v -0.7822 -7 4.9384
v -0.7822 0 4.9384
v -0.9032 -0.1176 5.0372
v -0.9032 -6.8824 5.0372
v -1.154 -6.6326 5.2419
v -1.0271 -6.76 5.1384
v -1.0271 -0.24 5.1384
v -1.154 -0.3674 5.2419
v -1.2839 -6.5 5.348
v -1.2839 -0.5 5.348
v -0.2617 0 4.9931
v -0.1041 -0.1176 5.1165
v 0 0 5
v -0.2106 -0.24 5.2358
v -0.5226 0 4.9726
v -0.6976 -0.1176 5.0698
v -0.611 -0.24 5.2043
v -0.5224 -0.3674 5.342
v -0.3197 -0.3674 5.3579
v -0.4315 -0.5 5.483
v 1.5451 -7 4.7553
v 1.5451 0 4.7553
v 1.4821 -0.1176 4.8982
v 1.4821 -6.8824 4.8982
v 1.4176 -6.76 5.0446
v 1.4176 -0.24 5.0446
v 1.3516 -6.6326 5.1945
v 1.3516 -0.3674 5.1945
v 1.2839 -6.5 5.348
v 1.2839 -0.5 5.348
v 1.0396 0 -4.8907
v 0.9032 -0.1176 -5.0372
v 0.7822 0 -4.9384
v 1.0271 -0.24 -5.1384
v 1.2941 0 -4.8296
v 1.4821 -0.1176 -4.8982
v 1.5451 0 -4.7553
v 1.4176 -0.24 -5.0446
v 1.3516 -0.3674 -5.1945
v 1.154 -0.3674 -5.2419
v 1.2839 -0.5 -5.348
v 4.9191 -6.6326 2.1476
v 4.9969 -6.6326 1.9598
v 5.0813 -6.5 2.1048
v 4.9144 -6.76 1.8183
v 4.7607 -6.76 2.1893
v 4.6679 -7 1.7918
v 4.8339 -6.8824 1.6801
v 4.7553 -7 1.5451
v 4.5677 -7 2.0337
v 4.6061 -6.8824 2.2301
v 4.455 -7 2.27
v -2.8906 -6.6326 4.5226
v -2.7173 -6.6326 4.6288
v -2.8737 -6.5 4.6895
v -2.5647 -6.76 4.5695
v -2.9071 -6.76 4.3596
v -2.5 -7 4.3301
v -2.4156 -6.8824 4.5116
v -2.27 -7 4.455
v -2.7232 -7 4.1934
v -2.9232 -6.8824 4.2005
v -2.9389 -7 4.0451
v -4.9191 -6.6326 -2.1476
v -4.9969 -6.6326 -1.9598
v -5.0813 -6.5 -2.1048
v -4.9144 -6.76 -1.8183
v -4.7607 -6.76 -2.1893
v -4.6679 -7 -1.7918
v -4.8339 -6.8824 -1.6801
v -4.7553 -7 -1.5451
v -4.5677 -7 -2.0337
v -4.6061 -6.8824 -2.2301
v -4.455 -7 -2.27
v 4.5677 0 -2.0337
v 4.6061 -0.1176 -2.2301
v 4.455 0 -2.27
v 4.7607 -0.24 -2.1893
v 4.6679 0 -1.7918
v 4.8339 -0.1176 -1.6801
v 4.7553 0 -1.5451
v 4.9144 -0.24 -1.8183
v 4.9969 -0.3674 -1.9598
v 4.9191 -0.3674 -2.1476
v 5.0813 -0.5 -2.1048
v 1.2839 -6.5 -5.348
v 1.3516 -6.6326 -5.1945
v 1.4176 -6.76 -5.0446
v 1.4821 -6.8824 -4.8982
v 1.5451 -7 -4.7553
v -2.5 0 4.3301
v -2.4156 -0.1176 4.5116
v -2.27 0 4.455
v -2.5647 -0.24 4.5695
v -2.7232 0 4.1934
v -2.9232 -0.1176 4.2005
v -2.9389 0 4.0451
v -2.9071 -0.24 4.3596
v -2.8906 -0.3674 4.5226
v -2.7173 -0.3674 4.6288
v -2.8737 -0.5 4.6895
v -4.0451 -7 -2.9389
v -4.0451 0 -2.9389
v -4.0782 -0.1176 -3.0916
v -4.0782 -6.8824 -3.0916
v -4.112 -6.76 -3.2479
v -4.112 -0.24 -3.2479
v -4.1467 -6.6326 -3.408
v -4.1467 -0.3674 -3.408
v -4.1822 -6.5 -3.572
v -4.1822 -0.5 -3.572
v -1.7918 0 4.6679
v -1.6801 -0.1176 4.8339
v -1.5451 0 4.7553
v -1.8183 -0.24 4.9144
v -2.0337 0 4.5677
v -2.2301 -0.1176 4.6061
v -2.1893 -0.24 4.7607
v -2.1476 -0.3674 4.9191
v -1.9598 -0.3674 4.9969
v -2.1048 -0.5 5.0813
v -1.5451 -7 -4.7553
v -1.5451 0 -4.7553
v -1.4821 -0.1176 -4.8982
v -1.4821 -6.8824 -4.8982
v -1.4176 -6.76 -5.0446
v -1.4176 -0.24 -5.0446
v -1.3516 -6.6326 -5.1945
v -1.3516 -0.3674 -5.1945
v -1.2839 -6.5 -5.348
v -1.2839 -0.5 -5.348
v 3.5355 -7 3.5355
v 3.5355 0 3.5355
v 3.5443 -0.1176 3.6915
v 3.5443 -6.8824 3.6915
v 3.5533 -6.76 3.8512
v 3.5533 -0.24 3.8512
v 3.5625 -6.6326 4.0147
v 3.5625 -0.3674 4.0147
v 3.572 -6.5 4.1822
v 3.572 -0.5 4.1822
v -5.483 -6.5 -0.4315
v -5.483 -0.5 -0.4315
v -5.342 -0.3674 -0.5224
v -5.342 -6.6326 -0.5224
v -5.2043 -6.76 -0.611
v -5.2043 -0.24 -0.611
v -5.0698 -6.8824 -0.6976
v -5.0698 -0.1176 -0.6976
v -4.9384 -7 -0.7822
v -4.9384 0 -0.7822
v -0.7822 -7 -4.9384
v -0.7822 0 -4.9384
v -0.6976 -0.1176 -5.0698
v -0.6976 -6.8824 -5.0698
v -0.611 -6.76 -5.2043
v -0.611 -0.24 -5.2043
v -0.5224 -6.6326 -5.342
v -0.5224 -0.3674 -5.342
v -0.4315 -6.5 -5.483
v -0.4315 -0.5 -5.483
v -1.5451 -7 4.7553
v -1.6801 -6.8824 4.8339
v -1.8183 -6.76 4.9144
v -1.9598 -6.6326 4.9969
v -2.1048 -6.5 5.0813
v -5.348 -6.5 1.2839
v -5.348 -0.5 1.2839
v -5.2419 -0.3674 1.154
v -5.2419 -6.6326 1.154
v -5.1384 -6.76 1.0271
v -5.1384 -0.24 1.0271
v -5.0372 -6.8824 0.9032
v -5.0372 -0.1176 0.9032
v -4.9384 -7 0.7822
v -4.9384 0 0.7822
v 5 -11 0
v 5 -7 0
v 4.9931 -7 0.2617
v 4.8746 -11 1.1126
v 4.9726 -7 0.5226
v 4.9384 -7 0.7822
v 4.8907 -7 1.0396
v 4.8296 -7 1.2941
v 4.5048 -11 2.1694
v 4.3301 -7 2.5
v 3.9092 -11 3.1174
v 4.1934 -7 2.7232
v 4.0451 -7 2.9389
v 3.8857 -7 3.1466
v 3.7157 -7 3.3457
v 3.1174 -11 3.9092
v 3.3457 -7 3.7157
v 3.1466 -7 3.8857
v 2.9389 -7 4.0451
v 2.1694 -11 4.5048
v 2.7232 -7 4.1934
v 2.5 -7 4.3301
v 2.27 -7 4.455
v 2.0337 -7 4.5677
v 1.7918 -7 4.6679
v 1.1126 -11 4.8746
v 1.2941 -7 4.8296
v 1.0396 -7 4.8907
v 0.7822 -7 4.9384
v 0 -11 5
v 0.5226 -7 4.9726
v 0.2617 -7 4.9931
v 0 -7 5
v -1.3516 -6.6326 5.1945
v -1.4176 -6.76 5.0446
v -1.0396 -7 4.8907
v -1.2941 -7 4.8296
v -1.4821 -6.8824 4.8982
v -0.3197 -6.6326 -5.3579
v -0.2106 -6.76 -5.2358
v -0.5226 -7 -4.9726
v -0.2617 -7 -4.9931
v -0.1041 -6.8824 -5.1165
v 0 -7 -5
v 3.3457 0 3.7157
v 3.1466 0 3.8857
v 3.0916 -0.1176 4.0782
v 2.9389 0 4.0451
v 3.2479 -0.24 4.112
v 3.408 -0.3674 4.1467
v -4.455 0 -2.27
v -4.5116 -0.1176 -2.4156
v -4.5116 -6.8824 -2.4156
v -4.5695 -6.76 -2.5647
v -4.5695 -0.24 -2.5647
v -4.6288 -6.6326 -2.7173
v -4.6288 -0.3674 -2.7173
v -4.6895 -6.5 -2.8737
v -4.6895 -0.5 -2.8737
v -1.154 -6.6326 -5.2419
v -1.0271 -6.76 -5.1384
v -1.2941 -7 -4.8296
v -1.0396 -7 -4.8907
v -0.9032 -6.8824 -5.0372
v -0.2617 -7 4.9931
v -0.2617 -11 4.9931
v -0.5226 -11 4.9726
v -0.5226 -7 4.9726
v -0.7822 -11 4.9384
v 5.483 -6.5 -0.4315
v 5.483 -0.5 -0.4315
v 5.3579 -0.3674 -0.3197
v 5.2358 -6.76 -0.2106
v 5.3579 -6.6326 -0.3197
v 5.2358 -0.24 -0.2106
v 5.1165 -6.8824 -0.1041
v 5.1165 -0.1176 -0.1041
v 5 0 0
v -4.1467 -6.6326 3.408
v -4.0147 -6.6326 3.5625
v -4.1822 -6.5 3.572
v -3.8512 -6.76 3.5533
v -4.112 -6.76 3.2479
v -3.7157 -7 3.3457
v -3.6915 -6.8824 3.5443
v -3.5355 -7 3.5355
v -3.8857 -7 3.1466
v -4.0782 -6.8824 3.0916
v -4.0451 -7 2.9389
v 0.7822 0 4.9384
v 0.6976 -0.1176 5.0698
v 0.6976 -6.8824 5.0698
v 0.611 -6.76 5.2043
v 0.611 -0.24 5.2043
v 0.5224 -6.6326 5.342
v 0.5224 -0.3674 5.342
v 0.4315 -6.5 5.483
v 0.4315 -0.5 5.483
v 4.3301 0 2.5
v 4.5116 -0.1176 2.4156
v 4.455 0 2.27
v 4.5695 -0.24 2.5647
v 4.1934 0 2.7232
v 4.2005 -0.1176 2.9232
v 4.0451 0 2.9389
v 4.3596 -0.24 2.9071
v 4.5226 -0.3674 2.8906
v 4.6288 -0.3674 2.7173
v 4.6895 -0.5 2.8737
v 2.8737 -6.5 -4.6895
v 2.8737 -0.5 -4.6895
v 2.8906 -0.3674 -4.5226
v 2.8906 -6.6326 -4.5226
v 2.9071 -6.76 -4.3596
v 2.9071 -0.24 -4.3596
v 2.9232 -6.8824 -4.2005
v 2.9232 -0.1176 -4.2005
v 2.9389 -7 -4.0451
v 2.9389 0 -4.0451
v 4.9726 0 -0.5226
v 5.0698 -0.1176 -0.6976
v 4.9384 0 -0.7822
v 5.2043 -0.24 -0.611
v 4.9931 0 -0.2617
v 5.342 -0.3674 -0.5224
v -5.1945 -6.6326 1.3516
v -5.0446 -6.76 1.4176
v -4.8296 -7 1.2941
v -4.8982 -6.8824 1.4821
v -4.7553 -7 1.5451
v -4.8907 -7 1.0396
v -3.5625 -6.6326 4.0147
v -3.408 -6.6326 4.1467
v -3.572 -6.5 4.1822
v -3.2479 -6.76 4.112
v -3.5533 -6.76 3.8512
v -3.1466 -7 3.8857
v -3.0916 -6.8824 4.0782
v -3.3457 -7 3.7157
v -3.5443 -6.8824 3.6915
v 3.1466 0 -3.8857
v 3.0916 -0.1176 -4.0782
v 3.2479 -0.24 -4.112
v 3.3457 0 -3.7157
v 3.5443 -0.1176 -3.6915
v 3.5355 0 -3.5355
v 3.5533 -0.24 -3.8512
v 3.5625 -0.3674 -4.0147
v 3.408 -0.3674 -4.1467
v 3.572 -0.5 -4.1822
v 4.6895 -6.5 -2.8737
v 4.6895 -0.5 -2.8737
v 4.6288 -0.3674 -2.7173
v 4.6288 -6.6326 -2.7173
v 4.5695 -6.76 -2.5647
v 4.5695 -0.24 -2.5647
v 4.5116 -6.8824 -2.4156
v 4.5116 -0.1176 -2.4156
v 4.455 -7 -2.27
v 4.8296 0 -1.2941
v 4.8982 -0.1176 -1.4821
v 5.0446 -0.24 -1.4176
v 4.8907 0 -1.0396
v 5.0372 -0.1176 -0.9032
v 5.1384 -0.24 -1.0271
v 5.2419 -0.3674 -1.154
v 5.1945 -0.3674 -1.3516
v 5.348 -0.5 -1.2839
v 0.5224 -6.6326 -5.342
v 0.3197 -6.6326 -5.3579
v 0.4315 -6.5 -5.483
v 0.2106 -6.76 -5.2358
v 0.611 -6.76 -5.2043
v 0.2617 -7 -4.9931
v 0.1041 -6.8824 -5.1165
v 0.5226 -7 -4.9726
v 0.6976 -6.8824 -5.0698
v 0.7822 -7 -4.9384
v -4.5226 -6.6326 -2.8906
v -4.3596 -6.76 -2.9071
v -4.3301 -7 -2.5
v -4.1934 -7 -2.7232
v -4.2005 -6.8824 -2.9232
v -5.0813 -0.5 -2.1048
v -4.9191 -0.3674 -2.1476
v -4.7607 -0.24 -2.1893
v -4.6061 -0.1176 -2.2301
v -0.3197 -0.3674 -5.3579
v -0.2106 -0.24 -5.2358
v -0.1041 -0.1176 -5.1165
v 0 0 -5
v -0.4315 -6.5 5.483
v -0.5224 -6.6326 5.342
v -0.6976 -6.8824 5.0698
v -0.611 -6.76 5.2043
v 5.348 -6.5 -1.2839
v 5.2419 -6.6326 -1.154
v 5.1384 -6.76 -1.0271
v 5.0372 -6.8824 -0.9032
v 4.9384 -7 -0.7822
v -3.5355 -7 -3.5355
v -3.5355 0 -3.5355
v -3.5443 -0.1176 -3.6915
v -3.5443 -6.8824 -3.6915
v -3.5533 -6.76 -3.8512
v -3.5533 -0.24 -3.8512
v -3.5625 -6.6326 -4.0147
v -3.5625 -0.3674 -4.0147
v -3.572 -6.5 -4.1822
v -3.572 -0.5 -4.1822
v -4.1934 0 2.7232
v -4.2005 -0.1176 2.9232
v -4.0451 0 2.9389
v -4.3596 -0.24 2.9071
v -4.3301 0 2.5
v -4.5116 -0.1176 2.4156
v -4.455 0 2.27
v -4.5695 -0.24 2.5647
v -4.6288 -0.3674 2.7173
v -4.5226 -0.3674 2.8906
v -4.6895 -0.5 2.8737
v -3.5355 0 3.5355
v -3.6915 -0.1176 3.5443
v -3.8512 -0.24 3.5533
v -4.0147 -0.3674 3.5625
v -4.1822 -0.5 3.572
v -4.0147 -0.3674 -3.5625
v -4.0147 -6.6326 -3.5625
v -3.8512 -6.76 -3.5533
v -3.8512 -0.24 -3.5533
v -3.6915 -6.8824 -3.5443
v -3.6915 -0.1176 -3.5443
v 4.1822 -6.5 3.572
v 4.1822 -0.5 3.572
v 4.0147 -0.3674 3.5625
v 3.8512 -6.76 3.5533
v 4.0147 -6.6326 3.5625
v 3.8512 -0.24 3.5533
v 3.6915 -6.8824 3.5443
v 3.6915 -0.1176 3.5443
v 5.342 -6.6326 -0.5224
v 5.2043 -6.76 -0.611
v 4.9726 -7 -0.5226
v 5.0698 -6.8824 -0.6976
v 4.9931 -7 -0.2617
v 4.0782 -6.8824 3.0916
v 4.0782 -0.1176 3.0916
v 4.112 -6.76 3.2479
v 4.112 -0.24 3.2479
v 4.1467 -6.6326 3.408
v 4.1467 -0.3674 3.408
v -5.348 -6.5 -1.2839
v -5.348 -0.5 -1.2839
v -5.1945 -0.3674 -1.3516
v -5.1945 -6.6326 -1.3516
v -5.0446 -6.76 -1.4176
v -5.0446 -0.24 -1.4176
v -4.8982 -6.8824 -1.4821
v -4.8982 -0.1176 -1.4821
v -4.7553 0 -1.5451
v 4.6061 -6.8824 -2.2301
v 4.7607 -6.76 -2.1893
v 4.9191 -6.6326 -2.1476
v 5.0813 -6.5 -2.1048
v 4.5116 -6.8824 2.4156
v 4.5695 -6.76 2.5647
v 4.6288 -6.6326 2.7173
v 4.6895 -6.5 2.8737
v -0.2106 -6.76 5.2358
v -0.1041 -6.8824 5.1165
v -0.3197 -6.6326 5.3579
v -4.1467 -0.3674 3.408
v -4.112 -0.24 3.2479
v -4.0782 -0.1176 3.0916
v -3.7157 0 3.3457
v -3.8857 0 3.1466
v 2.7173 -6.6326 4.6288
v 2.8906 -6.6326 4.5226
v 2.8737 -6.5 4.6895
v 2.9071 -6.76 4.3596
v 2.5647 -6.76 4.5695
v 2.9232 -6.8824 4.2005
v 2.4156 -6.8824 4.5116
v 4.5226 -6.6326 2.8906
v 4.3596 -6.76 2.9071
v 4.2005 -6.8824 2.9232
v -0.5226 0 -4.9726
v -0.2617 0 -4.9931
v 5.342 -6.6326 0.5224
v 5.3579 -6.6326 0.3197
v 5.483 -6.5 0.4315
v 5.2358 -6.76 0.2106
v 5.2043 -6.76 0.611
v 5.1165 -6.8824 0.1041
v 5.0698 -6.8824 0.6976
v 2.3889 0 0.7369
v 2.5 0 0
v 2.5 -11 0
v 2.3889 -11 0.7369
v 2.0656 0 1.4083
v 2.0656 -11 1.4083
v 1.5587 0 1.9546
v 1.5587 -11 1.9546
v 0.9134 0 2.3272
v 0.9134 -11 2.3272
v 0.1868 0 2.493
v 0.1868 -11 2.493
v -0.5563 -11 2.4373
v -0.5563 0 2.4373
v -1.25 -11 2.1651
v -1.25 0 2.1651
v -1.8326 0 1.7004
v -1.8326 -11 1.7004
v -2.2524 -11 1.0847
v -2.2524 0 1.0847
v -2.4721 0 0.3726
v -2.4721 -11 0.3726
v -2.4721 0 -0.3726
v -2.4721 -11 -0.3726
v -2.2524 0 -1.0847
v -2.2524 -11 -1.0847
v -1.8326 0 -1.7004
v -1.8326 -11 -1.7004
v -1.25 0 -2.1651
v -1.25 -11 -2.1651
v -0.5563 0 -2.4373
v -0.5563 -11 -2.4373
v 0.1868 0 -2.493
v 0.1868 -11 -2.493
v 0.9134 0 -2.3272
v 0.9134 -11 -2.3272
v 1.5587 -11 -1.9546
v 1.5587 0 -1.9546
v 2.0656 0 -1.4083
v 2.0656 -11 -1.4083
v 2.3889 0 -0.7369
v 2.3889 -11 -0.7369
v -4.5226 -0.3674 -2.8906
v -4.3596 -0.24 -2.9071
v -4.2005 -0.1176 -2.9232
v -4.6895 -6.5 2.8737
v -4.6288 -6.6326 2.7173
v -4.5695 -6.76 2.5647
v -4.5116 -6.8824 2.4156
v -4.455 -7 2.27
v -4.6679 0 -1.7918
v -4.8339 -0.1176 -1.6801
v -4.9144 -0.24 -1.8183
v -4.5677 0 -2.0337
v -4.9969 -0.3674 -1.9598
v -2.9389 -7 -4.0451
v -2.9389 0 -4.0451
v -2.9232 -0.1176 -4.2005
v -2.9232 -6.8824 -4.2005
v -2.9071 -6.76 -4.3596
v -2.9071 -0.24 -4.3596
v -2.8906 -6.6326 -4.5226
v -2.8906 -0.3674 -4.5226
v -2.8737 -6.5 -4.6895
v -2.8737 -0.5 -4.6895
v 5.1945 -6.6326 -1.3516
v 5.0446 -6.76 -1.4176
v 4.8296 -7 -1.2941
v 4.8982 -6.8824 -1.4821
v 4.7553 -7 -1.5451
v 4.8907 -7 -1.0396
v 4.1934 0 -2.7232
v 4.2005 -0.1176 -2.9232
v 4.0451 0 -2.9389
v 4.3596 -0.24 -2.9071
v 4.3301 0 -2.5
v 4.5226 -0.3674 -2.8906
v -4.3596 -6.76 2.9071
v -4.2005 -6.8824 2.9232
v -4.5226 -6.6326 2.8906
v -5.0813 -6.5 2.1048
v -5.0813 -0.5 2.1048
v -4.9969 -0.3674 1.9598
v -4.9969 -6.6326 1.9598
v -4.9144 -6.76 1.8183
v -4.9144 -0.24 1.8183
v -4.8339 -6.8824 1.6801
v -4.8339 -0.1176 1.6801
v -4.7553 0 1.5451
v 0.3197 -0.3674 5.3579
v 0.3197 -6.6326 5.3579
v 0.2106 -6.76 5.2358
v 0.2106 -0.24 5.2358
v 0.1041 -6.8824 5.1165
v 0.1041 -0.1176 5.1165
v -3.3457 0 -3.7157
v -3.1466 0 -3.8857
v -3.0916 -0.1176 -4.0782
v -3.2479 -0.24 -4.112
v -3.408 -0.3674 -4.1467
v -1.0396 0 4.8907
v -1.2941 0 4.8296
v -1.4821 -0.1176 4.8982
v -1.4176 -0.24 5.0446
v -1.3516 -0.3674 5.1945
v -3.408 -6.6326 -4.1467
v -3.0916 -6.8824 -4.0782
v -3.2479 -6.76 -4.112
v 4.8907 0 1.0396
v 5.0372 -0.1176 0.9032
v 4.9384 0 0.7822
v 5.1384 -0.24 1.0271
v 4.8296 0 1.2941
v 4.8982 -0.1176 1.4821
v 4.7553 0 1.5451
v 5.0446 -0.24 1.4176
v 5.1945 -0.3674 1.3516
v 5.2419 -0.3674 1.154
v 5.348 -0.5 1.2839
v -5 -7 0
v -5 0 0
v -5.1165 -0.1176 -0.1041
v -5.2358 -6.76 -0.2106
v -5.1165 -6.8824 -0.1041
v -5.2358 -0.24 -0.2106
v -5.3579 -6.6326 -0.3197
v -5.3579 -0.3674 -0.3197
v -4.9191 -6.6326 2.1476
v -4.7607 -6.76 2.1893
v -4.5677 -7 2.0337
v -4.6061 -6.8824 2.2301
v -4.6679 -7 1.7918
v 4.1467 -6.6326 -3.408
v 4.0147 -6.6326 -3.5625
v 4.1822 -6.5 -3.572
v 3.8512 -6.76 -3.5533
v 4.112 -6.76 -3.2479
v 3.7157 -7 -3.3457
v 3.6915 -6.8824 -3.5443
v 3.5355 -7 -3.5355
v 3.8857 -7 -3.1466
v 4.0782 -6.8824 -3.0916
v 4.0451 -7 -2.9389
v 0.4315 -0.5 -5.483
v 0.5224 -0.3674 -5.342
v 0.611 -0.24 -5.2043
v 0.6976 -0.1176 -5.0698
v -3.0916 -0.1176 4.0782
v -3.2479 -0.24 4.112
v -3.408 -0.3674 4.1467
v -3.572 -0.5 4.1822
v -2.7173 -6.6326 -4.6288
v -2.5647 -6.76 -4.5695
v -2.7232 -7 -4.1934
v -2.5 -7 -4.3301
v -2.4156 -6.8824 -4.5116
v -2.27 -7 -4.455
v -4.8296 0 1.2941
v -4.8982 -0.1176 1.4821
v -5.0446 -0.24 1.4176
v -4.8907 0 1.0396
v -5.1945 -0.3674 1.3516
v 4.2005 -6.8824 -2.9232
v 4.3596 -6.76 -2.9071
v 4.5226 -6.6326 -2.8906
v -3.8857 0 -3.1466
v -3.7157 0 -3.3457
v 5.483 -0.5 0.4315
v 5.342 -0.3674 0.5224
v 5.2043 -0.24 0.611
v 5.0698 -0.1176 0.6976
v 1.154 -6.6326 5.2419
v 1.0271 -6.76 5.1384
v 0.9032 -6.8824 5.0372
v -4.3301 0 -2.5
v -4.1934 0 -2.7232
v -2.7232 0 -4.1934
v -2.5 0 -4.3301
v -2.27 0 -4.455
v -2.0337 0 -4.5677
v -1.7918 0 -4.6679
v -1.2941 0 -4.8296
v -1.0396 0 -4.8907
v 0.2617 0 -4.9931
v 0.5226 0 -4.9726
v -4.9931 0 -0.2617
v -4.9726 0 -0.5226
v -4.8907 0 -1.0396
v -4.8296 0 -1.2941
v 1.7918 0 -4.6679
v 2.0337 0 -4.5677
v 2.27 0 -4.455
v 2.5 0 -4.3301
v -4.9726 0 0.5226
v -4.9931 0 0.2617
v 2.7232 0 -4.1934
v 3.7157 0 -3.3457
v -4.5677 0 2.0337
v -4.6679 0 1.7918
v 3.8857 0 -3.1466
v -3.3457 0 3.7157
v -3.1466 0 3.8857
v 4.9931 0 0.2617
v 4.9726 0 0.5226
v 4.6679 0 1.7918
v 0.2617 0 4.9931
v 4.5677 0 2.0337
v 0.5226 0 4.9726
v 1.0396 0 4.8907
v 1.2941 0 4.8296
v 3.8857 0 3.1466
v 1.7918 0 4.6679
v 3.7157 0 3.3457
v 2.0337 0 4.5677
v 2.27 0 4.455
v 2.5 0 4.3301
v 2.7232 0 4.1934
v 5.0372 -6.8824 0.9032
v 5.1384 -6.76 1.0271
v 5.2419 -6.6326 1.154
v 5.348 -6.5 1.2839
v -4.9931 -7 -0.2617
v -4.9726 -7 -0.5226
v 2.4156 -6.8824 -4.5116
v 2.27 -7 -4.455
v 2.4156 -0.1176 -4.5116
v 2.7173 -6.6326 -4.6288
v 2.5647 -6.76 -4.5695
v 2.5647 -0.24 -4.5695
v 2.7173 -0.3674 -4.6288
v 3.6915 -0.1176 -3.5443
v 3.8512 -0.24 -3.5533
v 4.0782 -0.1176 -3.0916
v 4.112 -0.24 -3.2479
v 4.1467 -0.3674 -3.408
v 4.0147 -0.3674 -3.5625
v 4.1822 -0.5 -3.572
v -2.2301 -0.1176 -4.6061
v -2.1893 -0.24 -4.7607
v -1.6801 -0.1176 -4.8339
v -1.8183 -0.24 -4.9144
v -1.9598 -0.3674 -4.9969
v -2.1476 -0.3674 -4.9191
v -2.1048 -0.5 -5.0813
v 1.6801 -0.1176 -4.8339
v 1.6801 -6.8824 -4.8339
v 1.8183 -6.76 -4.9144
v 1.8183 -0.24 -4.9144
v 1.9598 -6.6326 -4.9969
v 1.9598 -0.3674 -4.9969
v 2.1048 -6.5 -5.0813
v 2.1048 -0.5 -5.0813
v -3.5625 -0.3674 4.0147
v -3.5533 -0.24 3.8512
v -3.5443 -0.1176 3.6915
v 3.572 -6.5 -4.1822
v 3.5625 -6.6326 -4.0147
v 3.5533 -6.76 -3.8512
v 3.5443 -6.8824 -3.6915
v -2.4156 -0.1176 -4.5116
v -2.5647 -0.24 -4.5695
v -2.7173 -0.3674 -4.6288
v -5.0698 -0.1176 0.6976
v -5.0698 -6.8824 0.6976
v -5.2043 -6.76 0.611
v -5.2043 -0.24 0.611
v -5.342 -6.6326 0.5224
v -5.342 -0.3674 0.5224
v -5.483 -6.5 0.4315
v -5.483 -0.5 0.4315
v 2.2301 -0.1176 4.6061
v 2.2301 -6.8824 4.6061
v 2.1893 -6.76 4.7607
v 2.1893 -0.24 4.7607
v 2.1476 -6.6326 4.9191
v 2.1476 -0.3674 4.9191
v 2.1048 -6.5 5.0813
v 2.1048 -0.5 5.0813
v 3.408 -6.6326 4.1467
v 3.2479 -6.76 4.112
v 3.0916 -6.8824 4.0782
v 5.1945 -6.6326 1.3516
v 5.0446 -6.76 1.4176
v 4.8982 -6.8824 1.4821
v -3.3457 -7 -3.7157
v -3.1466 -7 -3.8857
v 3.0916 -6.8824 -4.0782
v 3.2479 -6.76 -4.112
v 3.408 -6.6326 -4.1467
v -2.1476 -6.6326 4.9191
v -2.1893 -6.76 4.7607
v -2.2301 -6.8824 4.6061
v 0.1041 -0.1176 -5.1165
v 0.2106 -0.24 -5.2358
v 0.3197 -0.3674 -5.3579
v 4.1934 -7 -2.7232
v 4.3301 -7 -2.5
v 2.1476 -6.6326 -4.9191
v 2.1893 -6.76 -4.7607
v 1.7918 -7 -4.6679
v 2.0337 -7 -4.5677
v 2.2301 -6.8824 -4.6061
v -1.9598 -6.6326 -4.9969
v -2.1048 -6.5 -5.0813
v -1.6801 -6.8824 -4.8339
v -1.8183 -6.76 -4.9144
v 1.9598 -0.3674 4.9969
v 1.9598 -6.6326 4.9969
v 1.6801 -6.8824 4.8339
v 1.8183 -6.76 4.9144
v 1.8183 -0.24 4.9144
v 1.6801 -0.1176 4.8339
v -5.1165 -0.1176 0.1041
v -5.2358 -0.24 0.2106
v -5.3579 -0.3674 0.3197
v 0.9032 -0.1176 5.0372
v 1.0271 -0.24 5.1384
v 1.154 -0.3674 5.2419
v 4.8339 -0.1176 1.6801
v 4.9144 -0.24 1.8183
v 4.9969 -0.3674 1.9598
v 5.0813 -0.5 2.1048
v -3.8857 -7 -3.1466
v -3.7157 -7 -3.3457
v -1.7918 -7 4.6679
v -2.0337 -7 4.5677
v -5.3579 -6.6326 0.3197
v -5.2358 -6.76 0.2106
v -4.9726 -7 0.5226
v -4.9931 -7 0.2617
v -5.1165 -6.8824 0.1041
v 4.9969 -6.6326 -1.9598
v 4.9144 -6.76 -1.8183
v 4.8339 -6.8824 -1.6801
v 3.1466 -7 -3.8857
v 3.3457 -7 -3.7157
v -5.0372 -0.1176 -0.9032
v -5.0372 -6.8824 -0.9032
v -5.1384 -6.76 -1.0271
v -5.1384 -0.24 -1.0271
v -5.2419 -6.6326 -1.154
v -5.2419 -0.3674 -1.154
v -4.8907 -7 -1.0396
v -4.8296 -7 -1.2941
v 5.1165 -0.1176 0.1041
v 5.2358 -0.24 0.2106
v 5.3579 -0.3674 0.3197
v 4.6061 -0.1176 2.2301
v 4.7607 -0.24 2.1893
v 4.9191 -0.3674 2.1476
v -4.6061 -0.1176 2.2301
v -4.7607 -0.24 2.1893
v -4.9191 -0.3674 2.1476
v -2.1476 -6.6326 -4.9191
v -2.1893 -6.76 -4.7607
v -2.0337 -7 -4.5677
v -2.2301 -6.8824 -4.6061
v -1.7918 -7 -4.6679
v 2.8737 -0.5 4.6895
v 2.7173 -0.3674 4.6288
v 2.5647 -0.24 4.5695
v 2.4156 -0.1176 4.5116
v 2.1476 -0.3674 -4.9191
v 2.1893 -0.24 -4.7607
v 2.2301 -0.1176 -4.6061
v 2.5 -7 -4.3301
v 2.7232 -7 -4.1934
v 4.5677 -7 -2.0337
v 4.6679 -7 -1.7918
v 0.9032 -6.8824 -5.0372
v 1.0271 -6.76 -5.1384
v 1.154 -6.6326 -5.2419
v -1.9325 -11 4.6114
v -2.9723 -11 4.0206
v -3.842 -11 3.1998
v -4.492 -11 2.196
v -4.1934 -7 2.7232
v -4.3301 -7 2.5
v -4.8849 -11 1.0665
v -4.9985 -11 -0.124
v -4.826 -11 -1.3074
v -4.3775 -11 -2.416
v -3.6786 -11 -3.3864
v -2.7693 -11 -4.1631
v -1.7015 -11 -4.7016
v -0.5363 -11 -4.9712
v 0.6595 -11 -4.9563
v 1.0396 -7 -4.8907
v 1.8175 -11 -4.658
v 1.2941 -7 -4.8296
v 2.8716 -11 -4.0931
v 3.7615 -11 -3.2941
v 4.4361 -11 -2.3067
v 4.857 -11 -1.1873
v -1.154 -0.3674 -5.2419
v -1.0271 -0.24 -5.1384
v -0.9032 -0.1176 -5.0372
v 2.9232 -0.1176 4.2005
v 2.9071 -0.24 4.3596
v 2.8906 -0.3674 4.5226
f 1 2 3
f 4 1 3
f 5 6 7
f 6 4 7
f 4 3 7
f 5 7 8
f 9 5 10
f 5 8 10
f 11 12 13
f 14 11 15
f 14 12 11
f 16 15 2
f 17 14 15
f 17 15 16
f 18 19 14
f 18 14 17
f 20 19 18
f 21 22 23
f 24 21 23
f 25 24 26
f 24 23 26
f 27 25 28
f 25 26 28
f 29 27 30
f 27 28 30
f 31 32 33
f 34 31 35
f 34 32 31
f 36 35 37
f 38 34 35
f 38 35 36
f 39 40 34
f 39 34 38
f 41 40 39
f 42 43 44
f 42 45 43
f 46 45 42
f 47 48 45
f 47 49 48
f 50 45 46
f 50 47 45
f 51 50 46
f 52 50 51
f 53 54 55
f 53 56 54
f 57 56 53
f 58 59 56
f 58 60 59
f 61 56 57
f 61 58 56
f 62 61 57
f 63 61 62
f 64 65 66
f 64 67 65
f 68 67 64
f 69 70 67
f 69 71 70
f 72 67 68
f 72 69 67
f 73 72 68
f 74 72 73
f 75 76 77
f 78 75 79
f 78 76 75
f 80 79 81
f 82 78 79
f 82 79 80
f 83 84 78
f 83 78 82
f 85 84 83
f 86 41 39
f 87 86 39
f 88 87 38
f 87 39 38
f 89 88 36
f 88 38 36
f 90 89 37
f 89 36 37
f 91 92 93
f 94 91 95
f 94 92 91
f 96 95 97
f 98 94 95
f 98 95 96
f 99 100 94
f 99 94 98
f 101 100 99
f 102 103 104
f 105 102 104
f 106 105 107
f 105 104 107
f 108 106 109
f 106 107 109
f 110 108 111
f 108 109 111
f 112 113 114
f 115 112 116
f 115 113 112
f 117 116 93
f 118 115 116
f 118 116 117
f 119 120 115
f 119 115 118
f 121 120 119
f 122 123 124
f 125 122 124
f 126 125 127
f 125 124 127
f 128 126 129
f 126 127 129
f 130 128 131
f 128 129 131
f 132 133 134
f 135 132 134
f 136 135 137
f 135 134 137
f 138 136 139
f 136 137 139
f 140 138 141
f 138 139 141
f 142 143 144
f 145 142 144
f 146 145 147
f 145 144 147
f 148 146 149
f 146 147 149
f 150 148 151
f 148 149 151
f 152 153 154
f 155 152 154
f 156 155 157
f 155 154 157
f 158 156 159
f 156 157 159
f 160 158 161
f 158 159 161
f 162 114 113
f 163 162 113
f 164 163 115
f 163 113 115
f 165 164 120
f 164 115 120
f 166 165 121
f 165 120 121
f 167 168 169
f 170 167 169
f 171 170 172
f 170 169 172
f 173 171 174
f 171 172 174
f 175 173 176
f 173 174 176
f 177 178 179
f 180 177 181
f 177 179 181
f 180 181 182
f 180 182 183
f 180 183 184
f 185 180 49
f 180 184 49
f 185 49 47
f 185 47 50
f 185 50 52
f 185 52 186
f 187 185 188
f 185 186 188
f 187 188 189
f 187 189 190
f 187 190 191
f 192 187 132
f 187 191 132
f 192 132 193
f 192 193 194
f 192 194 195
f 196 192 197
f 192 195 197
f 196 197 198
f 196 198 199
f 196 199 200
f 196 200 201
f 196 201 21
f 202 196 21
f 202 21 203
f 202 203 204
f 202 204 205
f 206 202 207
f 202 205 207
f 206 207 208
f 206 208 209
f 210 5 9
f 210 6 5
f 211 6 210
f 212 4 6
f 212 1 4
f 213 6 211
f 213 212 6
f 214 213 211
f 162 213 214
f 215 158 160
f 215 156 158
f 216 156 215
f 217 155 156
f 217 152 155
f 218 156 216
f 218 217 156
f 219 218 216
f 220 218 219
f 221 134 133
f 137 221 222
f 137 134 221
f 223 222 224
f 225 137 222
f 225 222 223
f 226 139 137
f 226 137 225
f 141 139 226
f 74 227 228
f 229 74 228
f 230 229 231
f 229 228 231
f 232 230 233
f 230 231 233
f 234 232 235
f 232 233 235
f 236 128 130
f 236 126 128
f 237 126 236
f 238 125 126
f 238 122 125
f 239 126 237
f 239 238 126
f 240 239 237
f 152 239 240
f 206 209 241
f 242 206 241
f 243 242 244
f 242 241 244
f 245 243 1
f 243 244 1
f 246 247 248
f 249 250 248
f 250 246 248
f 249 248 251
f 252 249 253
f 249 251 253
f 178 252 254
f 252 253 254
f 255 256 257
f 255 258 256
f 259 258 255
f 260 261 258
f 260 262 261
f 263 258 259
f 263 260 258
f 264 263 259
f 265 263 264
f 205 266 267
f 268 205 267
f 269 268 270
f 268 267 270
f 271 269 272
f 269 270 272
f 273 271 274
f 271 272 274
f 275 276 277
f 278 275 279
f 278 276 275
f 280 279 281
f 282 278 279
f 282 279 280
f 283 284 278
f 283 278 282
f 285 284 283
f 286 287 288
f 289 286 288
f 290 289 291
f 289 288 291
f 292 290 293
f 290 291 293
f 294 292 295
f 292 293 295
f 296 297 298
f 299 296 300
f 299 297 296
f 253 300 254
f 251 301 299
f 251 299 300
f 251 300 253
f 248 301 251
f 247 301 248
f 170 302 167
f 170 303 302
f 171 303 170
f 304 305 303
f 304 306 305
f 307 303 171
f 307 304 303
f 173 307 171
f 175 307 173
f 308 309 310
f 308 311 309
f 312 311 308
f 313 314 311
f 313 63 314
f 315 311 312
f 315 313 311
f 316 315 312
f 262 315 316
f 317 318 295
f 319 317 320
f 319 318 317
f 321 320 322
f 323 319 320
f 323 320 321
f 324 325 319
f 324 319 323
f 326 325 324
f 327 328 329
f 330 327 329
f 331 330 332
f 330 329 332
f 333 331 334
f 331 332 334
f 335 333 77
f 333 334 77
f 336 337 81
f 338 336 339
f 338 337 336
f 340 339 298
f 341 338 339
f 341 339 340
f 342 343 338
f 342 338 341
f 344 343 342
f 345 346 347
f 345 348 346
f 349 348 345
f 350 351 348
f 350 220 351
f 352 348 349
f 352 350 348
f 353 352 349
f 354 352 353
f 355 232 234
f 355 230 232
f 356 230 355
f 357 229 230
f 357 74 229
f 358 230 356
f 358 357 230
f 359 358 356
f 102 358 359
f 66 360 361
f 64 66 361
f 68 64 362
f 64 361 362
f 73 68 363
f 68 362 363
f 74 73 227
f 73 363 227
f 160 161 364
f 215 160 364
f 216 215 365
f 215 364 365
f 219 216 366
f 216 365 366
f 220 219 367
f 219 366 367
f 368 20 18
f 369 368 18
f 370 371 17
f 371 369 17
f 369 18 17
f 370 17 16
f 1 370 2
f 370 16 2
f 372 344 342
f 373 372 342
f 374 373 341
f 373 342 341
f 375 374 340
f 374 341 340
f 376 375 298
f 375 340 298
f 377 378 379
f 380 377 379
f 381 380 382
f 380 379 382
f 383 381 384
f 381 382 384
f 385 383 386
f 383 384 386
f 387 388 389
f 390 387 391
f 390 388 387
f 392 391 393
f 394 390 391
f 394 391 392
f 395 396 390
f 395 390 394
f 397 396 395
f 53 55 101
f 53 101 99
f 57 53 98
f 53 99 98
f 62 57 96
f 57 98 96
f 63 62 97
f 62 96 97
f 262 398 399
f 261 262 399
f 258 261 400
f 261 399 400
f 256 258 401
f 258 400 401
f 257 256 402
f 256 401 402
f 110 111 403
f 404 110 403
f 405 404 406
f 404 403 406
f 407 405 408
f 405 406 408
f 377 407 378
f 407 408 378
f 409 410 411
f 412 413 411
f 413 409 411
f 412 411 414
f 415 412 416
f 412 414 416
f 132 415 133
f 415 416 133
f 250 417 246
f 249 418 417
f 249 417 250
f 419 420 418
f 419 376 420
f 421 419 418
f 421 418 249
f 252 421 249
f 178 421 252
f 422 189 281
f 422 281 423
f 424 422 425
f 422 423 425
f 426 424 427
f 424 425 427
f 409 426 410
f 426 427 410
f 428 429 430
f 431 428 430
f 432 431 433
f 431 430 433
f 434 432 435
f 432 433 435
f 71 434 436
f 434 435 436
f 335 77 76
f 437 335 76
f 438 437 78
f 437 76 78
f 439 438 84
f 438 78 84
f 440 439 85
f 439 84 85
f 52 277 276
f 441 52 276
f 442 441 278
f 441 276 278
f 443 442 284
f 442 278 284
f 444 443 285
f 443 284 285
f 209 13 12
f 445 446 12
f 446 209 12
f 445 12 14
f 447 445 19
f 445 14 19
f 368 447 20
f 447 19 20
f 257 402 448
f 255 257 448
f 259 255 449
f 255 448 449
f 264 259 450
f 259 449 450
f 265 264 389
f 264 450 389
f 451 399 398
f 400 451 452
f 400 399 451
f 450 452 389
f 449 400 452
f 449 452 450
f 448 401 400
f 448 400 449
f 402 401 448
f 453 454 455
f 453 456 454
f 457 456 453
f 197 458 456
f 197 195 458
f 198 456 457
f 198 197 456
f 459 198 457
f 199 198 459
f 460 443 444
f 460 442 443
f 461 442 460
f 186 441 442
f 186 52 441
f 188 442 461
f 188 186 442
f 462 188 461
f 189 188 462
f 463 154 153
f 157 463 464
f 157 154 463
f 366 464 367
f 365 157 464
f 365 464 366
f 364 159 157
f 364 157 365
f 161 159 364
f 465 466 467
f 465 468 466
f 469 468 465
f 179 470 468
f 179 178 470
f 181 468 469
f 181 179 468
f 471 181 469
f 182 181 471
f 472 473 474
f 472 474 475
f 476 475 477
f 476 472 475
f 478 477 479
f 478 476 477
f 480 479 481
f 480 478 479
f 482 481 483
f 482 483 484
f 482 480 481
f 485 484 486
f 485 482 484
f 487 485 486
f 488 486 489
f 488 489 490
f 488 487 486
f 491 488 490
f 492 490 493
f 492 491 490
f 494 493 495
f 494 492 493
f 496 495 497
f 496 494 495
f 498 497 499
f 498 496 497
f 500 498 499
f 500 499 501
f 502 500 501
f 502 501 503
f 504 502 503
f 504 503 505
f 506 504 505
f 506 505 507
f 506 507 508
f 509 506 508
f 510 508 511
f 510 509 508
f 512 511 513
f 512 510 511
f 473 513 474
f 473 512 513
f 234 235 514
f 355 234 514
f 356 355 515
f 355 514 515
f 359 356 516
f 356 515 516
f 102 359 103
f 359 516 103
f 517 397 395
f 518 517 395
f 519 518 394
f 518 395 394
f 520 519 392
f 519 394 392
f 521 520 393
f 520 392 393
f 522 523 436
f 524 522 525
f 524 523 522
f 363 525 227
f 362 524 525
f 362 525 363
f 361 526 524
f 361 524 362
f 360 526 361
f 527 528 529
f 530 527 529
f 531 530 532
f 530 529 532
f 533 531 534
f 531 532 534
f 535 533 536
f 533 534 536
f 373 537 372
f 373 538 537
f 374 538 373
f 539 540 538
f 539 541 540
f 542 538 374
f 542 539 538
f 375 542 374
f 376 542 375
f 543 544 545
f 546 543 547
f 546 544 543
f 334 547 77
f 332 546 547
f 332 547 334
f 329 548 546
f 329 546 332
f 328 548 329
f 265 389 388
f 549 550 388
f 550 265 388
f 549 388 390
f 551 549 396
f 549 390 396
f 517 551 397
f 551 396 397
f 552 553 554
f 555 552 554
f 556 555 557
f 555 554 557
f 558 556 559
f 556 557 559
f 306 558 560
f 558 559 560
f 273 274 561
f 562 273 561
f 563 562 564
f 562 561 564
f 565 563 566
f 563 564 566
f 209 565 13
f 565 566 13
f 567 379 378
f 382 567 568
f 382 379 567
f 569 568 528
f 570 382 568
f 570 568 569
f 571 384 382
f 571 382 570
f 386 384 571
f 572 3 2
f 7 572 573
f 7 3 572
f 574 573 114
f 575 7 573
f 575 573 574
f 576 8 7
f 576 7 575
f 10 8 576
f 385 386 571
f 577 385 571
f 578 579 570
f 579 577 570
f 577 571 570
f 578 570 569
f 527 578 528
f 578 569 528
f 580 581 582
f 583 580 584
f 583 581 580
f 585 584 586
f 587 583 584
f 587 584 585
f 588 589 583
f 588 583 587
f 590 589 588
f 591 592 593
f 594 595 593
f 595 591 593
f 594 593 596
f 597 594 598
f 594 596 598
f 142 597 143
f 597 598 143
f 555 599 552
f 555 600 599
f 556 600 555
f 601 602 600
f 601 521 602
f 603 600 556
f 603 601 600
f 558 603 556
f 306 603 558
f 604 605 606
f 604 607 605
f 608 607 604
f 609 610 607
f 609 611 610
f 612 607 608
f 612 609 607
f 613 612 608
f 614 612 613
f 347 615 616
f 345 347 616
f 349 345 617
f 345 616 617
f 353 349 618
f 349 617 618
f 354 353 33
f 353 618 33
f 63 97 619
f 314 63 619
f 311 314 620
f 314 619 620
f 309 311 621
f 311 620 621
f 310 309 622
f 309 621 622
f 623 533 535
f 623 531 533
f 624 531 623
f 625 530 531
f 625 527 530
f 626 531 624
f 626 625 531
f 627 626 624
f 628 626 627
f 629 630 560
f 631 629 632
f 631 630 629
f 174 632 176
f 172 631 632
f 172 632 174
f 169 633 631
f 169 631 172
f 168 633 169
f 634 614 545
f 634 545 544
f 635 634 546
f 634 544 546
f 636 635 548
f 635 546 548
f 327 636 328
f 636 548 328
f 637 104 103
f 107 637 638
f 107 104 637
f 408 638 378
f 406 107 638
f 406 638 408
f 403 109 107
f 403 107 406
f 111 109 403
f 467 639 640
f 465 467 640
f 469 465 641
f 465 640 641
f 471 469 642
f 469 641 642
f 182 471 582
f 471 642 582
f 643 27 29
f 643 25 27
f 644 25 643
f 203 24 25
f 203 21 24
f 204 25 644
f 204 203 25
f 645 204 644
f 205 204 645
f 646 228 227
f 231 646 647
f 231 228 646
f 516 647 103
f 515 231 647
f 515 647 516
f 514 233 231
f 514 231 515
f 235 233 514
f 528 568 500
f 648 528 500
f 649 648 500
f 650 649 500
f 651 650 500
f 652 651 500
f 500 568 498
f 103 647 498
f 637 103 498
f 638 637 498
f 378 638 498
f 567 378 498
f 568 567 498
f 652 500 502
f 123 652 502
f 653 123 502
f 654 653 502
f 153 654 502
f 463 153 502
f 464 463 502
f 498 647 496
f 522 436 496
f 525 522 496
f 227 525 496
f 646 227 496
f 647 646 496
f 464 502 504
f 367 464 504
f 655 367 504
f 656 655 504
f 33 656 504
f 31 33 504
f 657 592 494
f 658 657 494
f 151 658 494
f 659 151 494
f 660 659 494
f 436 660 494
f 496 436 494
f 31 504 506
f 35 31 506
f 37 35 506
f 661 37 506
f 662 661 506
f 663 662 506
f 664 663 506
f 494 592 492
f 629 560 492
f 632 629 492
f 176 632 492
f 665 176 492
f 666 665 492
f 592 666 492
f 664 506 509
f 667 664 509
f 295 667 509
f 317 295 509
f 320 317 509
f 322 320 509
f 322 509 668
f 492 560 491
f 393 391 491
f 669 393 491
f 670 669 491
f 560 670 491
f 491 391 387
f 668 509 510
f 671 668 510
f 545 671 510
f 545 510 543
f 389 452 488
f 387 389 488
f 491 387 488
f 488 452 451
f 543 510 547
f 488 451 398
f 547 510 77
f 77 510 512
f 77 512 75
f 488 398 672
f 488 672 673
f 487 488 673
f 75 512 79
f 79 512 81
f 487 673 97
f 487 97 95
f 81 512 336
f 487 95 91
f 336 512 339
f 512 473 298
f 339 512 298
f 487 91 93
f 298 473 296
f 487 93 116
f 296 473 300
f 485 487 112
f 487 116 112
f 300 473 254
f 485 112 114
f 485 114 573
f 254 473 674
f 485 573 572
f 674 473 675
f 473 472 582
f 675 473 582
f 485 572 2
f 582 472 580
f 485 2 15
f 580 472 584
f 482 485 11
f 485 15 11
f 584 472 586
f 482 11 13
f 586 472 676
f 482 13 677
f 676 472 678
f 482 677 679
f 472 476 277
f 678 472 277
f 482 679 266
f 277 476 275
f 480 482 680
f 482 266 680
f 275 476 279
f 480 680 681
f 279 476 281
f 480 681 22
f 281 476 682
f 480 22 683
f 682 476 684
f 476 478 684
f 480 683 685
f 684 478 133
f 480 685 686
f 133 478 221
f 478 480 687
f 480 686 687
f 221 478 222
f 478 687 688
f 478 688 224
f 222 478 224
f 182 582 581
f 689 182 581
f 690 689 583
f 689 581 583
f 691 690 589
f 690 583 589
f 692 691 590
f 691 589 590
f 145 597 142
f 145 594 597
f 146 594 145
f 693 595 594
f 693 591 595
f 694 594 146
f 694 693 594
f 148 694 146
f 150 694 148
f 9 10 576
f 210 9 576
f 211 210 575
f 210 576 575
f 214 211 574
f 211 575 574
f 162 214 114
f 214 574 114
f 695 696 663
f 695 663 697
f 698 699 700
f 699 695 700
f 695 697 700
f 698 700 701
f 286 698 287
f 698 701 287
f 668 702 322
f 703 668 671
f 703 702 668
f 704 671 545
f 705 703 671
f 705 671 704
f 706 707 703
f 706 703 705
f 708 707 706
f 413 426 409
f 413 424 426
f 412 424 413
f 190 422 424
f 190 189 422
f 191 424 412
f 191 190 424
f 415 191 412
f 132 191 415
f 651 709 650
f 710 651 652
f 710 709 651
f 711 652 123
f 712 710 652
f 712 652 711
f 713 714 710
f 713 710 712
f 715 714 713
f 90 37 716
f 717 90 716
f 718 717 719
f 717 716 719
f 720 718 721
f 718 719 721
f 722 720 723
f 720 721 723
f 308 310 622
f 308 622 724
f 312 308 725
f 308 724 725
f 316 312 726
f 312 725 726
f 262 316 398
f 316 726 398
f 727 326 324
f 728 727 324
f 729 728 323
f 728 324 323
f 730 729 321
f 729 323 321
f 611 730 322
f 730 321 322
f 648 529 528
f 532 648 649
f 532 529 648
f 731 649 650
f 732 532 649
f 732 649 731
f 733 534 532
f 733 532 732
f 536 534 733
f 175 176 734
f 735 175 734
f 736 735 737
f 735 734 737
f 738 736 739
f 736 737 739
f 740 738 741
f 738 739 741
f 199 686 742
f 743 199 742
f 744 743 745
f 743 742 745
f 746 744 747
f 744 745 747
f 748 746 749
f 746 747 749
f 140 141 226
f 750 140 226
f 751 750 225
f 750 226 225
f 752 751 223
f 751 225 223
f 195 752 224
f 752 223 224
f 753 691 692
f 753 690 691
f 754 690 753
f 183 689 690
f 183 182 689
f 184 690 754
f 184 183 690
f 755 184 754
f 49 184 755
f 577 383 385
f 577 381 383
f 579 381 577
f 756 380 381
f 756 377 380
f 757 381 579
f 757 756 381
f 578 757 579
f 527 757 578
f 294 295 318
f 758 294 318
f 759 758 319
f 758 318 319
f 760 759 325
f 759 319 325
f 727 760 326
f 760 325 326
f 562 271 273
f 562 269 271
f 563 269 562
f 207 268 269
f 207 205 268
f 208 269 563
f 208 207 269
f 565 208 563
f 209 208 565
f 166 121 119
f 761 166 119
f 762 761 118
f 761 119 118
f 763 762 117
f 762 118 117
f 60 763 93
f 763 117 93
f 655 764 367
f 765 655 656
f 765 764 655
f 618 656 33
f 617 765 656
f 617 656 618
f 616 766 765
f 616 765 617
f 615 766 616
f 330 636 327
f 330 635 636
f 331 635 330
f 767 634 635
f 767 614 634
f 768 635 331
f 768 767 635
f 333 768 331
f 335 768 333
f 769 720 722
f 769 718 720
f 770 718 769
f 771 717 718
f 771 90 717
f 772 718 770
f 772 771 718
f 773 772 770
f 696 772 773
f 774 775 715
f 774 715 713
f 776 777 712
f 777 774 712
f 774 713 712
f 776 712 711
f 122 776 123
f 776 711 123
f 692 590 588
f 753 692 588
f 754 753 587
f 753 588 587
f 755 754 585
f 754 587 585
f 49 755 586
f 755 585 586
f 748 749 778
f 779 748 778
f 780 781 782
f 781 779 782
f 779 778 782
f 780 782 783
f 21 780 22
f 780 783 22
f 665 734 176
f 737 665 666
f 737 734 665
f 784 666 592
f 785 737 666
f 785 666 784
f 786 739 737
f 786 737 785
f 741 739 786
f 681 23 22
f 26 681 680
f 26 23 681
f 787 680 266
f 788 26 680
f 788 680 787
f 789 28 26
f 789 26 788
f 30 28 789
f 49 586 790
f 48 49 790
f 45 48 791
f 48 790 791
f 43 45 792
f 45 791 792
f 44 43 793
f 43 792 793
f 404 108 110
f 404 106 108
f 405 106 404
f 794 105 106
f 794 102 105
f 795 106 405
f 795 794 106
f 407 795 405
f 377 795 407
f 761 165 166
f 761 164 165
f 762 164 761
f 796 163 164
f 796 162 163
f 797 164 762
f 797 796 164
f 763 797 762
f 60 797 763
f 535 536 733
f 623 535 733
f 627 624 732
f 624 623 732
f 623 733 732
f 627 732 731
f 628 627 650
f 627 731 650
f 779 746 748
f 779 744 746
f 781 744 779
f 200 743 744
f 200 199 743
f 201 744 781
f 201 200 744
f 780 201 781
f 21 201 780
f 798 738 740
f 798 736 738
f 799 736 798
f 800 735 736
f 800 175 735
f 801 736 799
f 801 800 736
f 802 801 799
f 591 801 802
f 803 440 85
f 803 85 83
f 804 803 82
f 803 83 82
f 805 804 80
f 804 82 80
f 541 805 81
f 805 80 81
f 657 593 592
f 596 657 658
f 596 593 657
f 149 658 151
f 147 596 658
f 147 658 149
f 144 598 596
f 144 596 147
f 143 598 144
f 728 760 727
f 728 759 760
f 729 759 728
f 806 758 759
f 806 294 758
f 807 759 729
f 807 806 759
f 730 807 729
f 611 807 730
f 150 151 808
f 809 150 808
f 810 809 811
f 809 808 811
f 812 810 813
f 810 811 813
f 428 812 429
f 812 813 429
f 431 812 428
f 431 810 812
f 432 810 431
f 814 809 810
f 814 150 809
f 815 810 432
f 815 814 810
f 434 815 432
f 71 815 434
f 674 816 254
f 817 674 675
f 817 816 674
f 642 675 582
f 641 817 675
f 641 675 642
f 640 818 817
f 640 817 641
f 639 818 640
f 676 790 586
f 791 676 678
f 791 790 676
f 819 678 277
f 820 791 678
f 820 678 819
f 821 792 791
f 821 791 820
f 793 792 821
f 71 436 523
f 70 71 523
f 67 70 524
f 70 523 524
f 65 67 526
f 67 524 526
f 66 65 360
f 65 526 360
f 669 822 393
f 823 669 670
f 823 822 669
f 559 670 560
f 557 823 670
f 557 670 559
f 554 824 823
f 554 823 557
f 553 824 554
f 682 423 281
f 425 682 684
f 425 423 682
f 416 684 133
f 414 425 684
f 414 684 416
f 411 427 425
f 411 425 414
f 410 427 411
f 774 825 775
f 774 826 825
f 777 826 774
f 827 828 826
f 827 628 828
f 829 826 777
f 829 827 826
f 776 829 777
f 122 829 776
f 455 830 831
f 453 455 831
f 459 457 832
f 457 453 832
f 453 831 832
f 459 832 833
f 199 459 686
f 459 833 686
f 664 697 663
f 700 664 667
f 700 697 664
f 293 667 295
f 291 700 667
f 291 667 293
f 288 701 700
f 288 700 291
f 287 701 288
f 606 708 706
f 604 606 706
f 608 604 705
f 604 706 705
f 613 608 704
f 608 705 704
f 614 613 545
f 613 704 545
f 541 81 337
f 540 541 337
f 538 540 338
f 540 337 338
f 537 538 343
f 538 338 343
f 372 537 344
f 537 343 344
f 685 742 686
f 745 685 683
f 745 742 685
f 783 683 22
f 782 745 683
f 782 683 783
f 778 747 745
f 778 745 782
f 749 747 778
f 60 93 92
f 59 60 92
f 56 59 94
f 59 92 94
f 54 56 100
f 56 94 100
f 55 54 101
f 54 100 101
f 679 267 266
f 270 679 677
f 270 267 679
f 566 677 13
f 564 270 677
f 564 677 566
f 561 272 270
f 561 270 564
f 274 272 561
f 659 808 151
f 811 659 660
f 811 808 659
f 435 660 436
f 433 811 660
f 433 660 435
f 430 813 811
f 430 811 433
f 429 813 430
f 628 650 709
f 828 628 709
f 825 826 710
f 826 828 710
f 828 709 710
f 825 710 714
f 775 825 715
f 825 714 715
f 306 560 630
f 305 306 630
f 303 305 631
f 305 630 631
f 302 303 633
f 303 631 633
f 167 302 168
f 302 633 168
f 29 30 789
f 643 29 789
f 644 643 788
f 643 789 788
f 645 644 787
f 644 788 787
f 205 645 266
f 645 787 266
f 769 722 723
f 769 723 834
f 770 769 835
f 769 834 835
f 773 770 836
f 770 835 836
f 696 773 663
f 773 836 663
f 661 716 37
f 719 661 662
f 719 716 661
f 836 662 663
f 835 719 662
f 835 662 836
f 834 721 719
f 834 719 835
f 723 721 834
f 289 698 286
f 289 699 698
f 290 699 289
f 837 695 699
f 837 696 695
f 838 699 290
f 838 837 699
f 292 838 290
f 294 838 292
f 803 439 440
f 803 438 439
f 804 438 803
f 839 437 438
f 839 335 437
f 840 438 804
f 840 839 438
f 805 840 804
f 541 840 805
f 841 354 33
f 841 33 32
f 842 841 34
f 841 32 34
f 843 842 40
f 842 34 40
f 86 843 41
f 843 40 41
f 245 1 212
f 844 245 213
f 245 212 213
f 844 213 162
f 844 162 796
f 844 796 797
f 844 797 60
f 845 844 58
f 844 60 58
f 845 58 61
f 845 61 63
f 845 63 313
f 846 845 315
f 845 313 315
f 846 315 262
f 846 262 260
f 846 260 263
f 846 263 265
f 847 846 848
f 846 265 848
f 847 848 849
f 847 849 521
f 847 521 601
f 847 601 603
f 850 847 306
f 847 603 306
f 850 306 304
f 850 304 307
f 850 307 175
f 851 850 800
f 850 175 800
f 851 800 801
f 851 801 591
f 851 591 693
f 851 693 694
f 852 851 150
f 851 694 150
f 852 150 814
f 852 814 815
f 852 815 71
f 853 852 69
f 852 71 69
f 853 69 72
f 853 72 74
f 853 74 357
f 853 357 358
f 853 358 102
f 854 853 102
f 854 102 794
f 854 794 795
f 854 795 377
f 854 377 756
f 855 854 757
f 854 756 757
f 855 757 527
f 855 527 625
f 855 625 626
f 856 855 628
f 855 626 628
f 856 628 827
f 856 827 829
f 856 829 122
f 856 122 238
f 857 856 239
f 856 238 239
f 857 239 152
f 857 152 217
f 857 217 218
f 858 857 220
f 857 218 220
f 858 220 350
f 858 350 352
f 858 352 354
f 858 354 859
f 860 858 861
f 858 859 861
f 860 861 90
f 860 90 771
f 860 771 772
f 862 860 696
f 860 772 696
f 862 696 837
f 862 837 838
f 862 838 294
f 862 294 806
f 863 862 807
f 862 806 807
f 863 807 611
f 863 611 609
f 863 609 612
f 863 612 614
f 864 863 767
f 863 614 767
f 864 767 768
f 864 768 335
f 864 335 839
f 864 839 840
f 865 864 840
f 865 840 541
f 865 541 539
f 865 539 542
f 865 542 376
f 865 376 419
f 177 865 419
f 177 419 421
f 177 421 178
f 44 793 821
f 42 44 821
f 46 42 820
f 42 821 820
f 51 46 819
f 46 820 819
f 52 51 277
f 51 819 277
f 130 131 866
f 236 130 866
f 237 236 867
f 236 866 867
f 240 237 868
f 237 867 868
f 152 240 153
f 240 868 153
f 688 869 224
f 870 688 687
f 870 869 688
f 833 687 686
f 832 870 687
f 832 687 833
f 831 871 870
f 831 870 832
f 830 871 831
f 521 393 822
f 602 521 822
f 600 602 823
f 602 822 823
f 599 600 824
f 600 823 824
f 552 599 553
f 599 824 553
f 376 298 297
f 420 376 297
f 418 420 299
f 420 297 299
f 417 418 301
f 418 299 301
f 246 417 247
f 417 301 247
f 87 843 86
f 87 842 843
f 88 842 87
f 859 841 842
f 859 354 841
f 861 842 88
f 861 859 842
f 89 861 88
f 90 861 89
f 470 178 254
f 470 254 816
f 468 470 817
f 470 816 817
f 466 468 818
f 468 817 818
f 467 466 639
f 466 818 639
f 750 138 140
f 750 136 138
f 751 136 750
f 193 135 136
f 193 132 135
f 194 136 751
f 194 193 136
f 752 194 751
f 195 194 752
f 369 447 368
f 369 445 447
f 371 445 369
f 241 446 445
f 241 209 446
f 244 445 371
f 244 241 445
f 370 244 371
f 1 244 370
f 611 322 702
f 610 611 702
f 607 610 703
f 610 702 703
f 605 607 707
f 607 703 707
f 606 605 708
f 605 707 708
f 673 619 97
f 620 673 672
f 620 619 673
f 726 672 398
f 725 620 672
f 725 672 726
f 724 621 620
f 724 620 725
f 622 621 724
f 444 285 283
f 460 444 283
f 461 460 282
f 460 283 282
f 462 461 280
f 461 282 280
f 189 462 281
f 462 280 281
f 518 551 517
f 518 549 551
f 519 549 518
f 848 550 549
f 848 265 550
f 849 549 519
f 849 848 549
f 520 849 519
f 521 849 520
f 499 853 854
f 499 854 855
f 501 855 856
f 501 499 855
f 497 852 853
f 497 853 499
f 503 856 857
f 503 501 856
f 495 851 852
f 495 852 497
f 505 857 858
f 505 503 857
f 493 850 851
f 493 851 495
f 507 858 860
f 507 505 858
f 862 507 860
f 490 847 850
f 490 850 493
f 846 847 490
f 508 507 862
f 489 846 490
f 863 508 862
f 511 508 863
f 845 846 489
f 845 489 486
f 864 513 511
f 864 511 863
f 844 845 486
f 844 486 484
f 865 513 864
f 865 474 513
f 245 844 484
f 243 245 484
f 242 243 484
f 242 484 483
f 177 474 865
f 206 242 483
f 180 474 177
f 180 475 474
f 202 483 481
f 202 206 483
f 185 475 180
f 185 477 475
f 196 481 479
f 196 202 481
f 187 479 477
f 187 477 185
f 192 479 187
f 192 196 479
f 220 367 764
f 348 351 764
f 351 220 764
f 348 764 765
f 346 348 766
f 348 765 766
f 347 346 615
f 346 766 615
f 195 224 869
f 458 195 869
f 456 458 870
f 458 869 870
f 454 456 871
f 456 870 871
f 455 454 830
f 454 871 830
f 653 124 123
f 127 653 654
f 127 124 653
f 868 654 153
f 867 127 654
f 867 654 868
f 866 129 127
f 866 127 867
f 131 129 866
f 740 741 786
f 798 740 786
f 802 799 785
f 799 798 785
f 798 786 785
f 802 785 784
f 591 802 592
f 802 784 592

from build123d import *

# Parameters (mm, degrees)
F0_R            = 2.5
F1_DEPTH        = 11
F2_DEPTH        = 7
F2_COPIES_COUNT = 40


# Not quite as in the source:
# - a pattern or mirror of a feature is missing from the dataset's text; its kind, count and spacing are read off the source's solid


with BuildPart() as f1:
    # F0 (on Front) → F1 (new body)
    with BuildSketch(Plane.XZ):
        with BuildLine():
            ThreePointArc((-0.7821723252, 4.938441703), (-3.2472402417, -3.802029828), (5, 0))
            ThreePointArc((5, 0), (3.5355339059, 3.5355339059), (0, 5))
            ThreePointArc((0, 5), (-0.3922954786, 4.9845866687), (-0.7821723252, 4.938441703))
        make_face()
        Circle(F0_R, mode=Mode.SUBTRACT)
    extrude(amount=F1_DEPTH)

    # F0 (on Front) → F2 (join)
    with BuildSketch(Plane.XZ):
        with BuildLine():
            ThreePointArc((-0.7821723252, 4.938441703), (-0.3922954786, 4.9845866687), (0, 5))
            Line((0, 5), (-0.4315250265, 5.4830453355))
            Line((-0.4315250265, 5.4830453355), (-0.7821723252, 4.938441703))
        make_face()
    f2 = extrude(amount=F2_DEPTH)

    # F2_copies: F2 ×40 about axis
    f2_copies_axis = Axis((0, 0, 0), (0, 1, 0))
    for i in range(1, F2_COPIES_COUNT):
        add(f2.rotate(f2_copies_axis, i * 360 / F2_COPIES_COUNT))

    # F3 (on Top) → F4 (revolve, cut)
    with BuildSketch(Plane.XY):
        Polygon((8, 0), (5, 0), (7, -2), (7, -5), (5, -7), (8, -7), align=None)
    revolve(axis=Axis((0, -7.7233230695, 0), (0, -1, 0)), mode=Mode.SUBTRACT)


solid = f1.part
